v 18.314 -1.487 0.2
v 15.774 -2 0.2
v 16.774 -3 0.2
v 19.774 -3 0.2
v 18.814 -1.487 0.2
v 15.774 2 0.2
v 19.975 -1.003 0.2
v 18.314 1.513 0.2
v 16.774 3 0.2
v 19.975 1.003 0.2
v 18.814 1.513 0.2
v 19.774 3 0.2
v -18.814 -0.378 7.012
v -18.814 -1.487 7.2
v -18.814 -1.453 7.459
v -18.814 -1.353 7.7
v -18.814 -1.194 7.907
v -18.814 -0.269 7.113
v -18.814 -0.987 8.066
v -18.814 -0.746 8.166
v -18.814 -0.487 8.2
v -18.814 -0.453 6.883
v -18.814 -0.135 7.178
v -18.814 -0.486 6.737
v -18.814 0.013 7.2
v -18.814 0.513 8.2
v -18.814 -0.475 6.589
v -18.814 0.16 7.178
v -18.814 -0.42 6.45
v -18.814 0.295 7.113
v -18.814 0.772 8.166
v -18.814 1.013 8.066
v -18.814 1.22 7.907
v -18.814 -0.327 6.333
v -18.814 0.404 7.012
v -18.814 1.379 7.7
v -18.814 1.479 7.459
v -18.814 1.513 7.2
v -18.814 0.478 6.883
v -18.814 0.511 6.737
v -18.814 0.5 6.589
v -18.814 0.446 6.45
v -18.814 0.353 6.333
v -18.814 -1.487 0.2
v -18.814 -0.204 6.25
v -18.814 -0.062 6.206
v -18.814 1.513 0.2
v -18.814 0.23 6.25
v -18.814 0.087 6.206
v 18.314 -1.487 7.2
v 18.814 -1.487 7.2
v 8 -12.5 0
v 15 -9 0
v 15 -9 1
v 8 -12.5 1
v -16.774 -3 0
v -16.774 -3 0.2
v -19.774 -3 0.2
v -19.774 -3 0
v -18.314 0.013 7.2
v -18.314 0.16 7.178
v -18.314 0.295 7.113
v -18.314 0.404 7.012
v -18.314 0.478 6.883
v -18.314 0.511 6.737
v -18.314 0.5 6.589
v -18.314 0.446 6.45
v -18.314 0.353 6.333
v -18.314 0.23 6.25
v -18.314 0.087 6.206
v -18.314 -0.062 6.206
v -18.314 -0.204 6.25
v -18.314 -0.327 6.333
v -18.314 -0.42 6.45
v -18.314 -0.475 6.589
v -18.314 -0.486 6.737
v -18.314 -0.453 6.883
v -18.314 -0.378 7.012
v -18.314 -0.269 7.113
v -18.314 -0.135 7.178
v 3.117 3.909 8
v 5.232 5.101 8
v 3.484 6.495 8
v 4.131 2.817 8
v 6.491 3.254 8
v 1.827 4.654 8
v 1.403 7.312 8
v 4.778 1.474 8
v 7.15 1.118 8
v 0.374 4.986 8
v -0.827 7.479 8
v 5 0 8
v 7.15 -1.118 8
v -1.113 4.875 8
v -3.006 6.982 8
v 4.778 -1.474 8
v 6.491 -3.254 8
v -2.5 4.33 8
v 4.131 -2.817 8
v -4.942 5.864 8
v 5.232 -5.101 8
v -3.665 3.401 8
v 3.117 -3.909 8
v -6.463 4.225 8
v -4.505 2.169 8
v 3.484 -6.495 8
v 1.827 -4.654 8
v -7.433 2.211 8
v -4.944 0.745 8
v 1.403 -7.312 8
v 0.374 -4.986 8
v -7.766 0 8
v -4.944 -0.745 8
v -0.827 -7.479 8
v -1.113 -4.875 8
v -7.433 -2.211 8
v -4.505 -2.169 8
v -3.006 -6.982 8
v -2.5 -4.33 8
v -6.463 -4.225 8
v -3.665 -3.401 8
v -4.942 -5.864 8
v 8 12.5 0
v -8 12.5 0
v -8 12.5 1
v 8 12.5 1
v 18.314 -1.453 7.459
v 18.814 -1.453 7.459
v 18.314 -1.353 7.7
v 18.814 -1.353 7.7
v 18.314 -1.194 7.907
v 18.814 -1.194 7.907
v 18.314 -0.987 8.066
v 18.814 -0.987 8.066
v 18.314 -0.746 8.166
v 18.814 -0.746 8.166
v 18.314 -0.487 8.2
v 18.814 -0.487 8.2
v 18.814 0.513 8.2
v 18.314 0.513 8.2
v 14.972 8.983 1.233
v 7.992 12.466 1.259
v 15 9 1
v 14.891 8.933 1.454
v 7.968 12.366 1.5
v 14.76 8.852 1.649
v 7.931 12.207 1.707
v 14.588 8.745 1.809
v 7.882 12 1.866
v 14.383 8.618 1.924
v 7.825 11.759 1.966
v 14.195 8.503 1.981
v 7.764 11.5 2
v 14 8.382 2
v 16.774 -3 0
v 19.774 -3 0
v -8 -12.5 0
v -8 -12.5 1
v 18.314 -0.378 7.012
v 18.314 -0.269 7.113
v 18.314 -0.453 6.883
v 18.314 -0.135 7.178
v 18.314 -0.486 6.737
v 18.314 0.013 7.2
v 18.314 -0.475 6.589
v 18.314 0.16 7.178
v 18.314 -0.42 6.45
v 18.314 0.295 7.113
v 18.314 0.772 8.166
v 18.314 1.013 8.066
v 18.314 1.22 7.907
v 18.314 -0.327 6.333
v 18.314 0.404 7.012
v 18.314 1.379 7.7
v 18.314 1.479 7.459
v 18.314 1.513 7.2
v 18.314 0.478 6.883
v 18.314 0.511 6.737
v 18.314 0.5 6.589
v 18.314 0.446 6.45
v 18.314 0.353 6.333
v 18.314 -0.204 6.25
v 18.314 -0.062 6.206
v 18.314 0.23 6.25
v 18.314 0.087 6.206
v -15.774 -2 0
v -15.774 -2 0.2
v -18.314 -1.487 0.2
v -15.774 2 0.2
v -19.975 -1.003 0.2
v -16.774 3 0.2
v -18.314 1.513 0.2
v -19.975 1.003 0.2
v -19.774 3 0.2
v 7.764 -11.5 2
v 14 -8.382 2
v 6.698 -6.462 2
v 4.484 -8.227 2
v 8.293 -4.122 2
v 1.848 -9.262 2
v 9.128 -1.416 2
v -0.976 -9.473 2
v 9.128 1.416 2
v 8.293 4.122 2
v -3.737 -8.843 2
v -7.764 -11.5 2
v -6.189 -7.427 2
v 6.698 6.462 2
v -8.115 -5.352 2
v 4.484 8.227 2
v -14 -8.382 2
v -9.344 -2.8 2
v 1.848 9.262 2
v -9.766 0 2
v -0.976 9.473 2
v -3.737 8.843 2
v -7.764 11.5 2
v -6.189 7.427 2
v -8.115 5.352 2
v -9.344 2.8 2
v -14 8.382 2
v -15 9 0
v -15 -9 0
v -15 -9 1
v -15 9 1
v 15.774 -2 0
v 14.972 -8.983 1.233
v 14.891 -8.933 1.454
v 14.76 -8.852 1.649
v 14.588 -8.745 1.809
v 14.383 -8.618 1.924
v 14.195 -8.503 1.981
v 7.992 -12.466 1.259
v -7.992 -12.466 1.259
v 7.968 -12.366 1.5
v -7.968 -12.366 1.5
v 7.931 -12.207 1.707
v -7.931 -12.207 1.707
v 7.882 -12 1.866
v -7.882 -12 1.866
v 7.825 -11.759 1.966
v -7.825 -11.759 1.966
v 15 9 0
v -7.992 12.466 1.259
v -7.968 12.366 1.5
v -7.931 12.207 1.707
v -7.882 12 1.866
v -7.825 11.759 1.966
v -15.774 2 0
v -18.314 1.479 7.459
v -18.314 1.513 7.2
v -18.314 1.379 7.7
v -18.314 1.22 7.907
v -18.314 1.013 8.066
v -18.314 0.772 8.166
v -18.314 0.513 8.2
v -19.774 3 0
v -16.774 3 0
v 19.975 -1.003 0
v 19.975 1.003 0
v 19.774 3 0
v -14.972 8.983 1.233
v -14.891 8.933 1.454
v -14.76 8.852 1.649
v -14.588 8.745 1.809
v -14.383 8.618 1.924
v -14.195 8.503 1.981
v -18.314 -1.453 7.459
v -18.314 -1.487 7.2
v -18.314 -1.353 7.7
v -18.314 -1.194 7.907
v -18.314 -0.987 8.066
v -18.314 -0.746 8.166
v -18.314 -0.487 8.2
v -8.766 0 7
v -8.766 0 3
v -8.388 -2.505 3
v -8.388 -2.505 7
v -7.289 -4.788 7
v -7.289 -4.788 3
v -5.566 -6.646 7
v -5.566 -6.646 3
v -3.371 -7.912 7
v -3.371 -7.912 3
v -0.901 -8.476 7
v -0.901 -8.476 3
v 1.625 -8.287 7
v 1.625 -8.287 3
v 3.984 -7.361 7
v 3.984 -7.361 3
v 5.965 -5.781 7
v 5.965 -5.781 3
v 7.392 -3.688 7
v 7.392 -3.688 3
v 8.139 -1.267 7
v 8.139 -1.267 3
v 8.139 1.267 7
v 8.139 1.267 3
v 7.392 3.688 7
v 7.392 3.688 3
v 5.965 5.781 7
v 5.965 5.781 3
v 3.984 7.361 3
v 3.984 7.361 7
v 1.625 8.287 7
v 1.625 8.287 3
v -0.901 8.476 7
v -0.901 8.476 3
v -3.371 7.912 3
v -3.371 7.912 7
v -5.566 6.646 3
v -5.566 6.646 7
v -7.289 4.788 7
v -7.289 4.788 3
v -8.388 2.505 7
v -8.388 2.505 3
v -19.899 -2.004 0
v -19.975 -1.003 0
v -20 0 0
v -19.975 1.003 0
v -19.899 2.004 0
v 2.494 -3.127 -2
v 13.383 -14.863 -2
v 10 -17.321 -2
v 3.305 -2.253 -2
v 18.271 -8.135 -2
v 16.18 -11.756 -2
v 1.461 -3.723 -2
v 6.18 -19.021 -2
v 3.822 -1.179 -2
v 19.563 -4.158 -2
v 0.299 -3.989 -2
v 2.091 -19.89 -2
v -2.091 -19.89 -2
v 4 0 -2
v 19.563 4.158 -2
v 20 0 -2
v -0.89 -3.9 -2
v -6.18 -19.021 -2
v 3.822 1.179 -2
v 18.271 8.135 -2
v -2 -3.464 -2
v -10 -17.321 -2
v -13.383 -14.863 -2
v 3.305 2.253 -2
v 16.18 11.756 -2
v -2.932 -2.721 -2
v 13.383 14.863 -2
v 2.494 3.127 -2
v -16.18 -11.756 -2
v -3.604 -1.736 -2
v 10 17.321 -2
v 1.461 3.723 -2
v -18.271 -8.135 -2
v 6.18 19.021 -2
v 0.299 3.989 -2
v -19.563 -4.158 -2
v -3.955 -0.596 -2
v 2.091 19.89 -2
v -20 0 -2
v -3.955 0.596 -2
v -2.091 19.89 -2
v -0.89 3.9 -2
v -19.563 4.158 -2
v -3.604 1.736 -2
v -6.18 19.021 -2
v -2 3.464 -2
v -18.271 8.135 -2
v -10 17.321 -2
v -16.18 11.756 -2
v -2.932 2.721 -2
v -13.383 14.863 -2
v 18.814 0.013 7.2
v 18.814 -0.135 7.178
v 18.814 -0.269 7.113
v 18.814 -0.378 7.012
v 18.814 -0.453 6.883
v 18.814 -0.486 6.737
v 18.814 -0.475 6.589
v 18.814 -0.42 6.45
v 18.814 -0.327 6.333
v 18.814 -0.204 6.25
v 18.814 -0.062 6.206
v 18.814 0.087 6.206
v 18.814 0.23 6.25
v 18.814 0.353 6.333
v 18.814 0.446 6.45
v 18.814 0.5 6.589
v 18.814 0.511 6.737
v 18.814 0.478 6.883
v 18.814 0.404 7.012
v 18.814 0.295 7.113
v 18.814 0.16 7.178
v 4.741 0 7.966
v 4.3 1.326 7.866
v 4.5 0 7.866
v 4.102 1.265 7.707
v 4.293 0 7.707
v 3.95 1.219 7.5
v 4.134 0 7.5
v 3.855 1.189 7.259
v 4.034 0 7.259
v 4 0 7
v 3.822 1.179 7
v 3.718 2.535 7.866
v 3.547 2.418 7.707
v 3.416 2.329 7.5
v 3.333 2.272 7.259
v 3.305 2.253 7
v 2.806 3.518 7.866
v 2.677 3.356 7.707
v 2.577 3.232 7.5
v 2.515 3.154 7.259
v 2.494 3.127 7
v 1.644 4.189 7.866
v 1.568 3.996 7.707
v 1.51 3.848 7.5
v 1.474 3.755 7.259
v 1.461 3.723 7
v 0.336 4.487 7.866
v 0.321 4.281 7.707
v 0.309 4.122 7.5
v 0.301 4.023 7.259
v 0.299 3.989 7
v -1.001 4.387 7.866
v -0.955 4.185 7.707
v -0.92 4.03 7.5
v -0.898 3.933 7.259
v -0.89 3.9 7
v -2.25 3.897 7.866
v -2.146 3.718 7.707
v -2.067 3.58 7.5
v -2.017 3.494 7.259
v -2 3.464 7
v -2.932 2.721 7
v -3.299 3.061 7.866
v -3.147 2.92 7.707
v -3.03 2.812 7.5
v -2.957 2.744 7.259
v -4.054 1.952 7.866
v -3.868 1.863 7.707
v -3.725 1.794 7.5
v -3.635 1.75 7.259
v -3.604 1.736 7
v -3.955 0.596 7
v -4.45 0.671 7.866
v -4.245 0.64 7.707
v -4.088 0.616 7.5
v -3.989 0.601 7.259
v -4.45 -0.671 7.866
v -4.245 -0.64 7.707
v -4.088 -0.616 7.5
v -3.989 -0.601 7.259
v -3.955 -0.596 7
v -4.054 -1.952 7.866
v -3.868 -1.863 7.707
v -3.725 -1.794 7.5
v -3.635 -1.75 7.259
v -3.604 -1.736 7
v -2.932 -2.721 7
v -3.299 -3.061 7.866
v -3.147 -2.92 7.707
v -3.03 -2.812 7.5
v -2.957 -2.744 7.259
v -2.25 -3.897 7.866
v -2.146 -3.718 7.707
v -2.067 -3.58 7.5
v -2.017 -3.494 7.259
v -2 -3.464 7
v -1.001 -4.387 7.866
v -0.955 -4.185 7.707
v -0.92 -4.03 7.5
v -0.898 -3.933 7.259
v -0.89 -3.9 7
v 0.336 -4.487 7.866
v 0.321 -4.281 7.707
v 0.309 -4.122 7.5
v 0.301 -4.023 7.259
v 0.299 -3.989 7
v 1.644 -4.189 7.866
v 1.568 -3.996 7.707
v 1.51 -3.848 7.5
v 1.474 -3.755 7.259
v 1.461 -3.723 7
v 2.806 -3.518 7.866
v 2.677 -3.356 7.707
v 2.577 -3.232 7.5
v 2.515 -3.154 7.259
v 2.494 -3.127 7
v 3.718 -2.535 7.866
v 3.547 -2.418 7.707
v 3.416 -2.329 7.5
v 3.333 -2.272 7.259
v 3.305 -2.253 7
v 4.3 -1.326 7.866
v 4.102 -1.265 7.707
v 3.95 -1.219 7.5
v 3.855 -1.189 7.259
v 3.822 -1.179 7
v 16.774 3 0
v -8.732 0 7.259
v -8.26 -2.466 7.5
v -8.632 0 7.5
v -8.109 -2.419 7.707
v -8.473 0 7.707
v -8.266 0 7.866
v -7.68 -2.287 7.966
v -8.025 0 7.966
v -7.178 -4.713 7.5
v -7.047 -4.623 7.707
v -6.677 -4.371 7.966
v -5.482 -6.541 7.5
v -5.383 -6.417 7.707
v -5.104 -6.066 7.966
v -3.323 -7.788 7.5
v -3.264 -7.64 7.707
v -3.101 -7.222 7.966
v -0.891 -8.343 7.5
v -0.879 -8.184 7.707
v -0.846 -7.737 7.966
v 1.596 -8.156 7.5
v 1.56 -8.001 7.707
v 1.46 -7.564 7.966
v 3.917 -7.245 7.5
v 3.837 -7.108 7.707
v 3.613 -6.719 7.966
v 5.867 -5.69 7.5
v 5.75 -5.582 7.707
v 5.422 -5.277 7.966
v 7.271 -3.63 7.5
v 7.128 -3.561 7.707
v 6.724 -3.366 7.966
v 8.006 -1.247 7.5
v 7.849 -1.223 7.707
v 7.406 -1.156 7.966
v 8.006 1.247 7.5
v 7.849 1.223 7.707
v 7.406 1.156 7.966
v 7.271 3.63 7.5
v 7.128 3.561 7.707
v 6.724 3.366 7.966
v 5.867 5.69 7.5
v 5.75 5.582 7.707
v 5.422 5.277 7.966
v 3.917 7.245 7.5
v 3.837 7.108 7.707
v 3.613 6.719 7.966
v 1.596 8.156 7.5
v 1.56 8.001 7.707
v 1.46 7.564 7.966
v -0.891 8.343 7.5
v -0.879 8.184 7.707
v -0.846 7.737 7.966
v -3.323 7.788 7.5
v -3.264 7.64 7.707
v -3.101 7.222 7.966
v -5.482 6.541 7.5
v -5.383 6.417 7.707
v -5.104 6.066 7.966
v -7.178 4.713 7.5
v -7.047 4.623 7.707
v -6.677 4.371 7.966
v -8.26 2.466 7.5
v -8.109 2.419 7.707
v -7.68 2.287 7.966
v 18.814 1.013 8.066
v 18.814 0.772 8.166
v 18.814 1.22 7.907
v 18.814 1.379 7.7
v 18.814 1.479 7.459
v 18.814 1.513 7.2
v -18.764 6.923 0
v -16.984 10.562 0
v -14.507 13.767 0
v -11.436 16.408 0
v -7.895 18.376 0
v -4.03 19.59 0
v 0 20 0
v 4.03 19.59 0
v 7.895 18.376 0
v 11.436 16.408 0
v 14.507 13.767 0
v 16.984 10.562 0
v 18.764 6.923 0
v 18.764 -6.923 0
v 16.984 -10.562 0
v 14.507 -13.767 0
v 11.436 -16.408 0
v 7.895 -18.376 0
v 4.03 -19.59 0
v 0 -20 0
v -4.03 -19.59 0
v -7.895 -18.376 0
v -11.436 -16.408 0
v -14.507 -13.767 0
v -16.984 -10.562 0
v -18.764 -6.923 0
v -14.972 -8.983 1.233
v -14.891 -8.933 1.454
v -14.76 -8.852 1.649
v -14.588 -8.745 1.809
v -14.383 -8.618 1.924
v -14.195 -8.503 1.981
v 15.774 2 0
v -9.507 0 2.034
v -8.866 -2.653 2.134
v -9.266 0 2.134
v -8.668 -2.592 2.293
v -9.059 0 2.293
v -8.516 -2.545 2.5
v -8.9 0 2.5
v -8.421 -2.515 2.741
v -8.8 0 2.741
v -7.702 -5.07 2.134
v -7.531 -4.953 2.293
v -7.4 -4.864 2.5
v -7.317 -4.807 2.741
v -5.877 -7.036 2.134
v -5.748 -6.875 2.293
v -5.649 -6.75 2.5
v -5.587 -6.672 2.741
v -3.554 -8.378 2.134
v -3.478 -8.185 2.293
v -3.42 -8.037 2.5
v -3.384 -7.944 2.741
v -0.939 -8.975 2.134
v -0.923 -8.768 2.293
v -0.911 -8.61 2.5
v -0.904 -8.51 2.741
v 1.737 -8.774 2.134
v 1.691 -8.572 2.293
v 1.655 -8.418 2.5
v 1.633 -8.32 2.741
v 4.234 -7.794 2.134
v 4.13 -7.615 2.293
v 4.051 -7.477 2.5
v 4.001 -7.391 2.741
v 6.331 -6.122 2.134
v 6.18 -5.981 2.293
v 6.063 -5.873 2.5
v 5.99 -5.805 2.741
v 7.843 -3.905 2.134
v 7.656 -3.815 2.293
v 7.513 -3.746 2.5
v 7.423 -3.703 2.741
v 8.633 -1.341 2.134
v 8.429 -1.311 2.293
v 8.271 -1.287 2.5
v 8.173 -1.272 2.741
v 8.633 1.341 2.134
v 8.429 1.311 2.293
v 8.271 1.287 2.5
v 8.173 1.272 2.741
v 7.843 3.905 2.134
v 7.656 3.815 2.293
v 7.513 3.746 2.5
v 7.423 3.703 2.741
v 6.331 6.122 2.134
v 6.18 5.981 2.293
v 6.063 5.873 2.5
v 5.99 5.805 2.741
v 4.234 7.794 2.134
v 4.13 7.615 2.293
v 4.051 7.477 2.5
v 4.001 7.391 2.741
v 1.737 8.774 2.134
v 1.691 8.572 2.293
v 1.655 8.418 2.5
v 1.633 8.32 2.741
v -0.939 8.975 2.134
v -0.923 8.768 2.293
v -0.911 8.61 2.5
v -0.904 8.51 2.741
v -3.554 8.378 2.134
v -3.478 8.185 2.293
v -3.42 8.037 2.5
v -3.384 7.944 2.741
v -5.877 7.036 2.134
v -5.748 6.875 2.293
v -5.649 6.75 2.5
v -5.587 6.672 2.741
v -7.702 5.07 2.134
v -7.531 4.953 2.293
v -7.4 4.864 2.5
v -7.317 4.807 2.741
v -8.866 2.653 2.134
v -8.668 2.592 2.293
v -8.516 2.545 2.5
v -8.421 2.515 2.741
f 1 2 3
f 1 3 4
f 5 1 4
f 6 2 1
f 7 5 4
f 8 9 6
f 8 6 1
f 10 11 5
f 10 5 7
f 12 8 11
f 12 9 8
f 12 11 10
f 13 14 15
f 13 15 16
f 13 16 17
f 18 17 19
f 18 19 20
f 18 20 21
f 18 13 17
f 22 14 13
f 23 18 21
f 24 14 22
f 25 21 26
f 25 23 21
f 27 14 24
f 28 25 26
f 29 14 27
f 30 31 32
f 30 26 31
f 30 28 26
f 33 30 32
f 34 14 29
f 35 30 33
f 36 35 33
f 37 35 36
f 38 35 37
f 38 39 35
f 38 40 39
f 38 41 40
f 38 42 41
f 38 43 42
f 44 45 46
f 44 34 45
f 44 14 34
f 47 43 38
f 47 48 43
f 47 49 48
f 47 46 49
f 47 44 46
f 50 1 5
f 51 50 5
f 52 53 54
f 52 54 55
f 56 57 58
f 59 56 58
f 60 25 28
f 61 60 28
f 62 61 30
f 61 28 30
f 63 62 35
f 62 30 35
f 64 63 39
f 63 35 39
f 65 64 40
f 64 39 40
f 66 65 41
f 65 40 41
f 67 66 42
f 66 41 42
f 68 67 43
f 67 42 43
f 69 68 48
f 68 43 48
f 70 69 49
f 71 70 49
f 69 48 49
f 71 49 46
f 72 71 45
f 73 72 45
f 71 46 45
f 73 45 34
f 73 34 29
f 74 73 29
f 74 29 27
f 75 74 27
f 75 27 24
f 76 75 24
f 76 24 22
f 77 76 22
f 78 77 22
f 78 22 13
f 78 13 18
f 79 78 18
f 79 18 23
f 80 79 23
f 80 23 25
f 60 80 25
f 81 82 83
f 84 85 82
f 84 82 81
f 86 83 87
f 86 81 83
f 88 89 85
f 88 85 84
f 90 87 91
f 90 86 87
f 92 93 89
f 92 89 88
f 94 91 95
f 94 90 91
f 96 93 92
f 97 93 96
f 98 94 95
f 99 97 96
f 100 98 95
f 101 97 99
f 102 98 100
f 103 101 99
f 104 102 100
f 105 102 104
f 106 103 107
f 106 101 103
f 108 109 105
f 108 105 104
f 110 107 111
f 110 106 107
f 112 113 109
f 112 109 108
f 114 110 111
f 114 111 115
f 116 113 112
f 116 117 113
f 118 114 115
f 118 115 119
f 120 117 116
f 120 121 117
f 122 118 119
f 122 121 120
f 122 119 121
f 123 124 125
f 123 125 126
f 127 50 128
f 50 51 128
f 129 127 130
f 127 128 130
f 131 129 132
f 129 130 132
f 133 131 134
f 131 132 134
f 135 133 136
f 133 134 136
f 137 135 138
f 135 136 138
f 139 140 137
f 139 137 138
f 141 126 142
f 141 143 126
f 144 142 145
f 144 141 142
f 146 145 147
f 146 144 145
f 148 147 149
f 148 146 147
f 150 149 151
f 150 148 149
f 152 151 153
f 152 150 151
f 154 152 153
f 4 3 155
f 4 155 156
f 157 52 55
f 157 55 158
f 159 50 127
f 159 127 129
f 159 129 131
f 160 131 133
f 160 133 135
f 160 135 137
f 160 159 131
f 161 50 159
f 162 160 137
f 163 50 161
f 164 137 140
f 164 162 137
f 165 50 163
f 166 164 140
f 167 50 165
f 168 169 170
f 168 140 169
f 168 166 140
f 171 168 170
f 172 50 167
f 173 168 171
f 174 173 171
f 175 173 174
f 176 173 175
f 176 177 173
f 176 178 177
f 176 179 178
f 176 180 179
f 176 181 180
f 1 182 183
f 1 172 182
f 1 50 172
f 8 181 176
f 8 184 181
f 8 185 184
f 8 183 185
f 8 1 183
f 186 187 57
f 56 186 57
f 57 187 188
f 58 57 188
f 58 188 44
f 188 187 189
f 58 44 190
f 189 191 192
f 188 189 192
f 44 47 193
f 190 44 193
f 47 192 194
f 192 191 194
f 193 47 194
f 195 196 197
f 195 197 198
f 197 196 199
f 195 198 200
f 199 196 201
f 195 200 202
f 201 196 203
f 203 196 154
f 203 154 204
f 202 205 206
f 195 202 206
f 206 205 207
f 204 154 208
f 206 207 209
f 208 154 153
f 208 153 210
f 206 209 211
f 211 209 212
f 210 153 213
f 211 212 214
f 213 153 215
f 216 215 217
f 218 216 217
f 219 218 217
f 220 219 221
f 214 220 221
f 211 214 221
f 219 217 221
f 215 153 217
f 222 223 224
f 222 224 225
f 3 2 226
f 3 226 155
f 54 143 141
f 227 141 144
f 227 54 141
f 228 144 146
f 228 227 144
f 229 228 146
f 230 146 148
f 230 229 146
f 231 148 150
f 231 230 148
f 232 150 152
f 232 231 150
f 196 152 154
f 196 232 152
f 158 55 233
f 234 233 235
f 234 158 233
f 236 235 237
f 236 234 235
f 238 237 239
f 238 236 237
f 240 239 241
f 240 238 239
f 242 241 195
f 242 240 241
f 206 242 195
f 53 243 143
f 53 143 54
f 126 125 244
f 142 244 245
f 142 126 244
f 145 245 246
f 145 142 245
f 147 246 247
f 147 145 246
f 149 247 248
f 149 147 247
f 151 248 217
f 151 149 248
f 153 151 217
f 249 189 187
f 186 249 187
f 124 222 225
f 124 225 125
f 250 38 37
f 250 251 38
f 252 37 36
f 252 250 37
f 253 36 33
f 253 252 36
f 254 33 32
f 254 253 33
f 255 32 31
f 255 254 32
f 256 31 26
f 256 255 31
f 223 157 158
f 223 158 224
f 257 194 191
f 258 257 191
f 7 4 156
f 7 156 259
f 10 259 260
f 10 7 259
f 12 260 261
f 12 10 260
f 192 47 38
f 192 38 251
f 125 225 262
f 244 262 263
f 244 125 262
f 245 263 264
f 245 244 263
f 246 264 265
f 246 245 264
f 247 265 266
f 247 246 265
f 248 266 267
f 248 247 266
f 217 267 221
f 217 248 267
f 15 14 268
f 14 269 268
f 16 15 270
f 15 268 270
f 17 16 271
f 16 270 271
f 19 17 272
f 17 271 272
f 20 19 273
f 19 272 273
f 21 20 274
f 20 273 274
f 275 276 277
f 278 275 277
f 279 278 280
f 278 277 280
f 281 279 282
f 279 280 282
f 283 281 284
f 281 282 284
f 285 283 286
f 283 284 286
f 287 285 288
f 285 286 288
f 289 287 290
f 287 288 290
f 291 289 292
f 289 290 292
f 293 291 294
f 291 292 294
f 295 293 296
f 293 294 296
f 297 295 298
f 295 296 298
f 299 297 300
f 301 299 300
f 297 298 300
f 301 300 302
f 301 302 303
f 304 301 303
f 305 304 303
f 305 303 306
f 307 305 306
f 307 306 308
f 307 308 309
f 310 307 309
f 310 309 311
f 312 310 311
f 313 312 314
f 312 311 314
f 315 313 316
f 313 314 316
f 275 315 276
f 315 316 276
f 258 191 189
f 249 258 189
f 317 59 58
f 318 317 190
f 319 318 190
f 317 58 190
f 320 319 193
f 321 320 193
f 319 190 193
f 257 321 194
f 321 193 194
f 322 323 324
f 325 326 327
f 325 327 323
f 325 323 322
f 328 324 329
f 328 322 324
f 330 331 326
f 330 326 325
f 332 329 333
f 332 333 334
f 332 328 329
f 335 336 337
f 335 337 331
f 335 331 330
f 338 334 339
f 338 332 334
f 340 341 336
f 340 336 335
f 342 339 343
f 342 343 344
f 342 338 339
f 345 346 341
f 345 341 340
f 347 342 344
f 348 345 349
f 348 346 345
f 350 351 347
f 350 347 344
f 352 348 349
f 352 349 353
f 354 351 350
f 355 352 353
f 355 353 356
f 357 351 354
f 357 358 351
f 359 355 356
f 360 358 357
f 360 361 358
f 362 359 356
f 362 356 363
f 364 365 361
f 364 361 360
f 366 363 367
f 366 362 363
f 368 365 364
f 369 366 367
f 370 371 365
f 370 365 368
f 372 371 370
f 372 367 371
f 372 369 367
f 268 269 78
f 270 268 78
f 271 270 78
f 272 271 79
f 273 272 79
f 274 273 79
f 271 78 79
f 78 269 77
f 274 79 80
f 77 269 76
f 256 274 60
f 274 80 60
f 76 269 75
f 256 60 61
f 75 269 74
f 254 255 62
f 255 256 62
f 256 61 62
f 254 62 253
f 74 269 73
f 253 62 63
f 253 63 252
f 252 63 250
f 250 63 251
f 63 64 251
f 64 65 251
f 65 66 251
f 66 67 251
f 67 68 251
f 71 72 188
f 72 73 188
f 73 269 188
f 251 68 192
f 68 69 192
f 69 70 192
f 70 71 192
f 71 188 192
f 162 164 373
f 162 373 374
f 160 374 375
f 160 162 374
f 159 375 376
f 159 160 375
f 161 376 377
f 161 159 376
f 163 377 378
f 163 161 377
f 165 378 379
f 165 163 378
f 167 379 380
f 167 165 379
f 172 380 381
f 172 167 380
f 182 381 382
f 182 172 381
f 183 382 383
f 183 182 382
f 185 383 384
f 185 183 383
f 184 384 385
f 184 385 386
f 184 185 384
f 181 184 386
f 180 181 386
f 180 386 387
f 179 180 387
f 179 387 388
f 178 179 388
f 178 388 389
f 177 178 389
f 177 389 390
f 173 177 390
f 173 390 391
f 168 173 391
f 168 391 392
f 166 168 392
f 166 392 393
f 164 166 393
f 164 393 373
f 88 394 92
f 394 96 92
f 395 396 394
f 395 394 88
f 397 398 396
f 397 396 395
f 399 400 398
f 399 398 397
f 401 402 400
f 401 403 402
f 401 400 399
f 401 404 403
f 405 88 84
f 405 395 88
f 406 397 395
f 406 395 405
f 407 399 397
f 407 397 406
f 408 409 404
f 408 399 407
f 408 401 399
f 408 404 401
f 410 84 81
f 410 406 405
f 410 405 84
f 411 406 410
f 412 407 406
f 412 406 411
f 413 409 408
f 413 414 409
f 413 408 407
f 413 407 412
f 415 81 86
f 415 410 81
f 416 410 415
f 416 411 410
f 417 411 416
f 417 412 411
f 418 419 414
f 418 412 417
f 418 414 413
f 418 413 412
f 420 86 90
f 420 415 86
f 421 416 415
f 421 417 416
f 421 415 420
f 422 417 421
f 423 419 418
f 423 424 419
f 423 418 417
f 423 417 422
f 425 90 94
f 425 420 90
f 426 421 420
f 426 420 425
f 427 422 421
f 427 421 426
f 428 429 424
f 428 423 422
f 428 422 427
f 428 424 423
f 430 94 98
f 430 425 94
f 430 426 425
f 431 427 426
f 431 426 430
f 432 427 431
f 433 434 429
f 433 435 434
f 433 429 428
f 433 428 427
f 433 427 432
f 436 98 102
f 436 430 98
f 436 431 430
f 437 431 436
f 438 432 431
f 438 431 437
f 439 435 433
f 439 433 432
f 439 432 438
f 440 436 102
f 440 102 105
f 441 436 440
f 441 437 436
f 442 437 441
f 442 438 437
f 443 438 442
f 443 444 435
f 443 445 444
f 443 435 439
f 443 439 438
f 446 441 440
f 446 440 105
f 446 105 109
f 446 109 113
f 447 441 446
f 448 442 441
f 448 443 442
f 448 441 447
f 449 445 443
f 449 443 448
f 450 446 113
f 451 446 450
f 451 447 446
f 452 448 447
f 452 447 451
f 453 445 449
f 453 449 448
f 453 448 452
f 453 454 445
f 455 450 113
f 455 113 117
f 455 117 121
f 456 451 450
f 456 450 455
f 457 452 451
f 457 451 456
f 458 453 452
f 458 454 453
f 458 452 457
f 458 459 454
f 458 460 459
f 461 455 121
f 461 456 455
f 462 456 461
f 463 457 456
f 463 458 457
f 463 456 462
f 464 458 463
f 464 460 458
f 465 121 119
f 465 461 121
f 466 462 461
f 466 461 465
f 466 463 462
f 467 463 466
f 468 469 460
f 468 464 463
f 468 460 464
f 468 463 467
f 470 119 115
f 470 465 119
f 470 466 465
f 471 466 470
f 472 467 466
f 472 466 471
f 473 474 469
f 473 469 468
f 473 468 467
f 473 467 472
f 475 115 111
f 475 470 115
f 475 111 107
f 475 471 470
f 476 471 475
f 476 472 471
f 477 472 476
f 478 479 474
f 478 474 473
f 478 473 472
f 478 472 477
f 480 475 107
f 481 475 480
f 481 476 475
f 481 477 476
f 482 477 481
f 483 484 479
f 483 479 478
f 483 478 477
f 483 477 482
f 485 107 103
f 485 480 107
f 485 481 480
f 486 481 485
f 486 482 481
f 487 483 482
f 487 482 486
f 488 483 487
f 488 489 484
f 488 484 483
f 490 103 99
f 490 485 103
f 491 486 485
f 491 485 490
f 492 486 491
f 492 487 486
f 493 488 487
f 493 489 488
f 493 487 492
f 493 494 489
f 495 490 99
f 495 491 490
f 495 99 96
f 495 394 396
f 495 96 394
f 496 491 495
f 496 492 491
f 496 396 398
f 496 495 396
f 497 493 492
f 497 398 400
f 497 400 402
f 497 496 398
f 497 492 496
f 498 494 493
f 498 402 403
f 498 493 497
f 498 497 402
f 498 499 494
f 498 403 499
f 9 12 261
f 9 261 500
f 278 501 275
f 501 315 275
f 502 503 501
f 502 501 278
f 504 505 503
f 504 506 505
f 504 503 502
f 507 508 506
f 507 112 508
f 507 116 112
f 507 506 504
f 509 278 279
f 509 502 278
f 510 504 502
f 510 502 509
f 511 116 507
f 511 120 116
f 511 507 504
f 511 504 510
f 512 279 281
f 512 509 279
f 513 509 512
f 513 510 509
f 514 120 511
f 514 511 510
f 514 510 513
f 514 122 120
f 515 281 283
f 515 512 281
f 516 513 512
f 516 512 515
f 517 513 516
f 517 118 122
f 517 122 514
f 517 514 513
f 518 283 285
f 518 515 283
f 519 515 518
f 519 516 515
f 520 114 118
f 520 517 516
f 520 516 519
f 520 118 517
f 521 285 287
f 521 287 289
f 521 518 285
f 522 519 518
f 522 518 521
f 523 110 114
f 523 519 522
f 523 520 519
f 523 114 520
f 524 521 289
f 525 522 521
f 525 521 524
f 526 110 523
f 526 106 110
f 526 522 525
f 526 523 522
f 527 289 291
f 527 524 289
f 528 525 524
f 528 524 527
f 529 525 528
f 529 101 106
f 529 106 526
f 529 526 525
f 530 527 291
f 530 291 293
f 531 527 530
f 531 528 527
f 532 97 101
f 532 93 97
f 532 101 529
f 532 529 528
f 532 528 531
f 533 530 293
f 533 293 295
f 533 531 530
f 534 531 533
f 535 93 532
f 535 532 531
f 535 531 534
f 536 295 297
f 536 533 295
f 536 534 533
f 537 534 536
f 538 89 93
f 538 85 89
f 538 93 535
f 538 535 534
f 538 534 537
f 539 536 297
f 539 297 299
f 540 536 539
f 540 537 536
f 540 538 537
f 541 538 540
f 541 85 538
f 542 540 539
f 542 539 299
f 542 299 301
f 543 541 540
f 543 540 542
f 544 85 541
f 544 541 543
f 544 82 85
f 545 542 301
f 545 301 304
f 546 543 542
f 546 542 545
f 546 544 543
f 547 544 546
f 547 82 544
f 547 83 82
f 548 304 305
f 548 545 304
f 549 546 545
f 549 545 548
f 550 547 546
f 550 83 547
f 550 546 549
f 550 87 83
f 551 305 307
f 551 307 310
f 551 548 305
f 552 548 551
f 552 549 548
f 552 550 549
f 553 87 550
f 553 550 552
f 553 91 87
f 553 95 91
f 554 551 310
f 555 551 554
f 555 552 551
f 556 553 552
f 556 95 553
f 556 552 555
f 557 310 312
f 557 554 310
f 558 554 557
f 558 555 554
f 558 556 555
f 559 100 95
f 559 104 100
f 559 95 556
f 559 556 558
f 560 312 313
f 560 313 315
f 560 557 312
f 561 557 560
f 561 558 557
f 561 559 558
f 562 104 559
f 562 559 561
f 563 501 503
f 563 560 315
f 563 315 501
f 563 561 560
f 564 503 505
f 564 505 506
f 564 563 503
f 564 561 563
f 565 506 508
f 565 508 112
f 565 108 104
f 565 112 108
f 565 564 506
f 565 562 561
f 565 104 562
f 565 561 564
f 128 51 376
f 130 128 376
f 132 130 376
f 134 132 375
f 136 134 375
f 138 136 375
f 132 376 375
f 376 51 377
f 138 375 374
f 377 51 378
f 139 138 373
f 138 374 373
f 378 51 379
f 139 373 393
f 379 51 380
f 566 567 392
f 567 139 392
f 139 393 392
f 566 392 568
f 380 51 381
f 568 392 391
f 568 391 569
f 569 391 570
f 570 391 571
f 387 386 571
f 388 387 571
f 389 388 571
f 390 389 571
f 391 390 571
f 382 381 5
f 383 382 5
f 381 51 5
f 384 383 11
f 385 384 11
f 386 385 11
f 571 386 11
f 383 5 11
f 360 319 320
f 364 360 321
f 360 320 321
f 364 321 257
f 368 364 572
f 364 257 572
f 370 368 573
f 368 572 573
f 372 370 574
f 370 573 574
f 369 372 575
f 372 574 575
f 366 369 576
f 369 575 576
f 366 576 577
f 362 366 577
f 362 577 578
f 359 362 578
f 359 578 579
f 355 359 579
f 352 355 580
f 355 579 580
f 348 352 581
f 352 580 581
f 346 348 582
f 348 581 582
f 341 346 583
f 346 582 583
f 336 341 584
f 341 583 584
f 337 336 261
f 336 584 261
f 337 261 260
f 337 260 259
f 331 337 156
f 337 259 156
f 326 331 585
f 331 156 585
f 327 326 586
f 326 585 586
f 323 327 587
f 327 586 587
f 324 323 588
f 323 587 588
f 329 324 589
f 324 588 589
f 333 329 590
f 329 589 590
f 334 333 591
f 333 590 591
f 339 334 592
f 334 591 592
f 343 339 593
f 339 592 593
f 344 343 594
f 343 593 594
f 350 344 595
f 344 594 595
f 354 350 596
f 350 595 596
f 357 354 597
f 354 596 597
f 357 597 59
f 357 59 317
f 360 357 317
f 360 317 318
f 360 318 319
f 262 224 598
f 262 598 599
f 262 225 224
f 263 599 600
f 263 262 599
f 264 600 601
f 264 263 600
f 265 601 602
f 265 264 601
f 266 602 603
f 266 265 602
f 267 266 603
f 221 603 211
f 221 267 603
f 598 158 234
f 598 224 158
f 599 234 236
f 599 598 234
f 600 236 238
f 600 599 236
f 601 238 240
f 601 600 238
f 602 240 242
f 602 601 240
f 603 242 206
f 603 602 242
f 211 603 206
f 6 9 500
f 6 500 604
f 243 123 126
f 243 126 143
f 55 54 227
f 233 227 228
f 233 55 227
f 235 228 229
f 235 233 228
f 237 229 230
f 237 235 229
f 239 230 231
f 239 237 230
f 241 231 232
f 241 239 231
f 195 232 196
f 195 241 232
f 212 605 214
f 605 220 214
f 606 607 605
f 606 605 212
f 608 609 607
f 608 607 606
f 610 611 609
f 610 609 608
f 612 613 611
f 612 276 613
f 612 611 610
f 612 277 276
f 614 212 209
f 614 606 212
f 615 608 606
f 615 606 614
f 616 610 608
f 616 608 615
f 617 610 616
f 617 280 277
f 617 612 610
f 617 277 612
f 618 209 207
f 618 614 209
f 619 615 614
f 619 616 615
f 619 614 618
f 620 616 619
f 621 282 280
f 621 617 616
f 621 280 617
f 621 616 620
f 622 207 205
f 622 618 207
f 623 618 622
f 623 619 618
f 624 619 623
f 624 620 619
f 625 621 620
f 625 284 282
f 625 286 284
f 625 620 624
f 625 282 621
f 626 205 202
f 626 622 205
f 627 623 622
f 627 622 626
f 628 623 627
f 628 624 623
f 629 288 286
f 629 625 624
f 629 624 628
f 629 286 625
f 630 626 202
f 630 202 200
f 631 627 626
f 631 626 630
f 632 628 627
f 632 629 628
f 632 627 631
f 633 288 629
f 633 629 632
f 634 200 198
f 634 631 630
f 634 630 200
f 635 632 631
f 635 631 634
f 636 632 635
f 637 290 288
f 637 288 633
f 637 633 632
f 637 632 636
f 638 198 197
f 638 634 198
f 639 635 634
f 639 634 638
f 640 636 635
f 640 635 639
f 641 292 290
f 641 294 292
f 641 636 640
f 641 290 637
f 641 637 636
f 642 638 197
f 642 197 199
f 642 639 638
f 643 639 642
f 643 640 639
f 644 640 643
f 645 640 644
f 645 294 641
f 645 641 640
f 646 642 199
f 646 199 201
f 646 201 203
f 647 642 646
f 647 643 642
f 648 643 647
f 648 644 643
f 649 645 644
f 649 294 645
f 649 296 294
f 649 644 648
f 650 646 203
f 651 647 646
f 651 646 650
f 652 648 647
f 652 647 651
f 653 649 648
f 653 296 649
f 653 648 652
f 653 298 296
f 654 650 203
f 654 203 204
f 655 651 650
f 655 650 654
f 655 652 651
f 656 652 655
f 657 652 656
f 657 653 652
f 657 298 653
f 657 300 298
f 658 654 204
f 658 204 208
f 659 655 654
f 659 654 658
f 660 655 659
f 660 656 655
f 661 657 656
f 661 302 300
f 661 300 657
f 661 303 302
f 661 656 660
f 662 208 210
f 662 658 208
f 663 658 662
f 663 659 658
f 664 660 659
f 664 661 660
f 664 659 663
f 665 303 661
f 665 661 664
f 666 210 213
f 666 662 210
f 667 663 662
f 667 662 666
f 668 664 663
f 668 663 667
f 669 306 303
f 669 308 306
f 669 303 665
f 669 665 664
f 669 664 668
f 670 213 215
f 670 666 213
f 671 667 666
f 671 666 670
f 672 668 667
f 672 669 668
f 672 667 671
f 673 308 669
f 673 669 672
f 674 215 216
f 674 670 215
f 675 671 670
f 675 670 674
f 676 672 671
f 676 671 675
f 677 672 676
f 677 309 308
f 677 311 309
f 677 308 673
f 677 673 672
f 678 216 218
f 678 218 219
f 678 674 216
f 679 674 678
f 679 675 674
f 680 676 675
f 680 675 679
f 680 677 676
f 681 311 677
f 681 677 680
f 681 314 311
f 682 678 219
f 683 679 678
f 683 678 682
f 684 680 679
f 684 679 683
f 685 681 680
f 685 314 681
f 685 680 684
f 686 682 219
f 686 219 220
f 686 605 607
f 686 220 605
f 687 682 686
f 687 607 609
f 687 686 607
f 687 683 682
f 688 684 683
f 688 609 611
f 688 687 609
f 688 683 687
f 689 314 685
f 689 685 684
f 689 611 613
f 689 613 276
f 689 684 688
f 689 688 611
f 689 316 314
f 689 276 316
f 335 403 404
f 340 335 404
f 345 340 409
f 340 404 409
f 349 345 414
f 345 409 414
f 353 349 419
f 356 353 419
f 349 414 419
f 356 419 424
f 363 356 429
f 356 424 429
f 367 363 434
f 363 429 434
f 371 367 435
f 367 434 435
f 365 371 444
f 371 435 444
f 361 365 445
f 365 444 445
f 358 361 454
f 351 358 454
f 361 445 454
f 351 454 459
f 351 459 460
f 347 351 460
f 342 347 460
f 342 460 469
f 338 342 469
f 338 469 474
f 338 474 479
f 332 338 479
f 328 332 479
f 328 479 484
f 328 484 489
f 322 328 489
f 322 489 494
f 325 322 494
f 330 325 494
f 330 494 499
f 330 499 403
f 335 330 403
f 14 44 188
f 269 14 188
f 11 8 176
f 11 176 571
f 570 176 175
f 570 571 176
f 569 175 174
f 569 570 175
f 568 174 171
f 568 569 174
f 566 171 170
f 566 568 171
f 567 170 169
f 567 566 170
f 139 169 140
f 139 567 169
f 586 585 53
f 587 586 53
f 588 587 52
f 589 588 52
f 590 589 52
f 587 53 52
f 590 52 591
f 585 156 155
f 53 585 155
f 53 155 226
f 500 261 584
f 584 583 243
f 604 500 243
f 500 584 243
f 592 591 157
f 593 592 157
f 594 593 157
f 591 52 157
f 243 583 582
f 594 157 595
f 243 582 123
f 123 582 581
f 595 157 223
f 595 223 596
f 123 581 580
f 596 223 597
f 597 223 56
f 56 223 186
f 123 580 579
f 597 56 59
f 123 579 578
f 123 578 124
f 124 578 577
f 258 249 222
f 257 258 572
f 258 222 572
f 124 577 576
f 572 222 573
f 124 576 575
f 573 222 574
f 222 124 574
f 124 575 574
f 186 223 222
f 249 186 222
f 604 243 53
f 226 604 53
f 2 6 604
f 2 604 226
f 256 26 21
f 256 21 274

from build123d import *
from build123d.topology import SkipClean

# Parameters (mm, degrees)
BOSS_EXTRUDE1_DEPTH = 2
SKETCH2_R           = 20
BOSS_EXTRUDE2_DEPTH = 2
FILLET1_R           = 1
SKETCH3_R           = 8.5
BOSS_EXTRUDE3_DEPTH = 6
SKETCH4_R           = 4
CUT_EXTRUDE1_DEPTH  = 31
FILLET2_R           = 1
BOSS_EXTRUDE4_START = 0.2
BOSS_EXTRUDE4_DEPTH = 0.2
SKETCH6_W           = 0.5
SKETCH6_H           = 3
BOSS_EXTRUDE5_DEPTH = 8
FILLET3_R           = 1
SKETCH7_R           = 0.5
CUT_EXTRUDE2_DEPTH  = 4
CUT_EXTRUDE3_START  = -4
SKETCH8_R           = 0.5
CUT_EXTRUDE3_DEPTH  = 4


with BuildPart() as part:
    # Sketch1 → Boss-Extrude1 (new body)
    with BuildSketch(Plane.XY):
        Polygon((-15, 9), (-8, 12.5), (8, 12.5), (15, 9), (15, -9), (8, -12.5), (-8, -12.5), (-15, -9), align=None)
    extrude(amount=BOSS_EXTRUDE1_DEPTH)

    # Sketch2 → Boss-Extrude2 (add)
    with BuildSketch(Plane(origin=(0, 0, 0), x_dir=(-1, 0, 0), z_dir=(0, 0, -1))):
        Circle(SKETCH2_R)
    extrude(amount=BOSS_EXTRUDE2_DEPTH)

    # Fillet1
    fillet1_edges = [part.edges().sort_by_distance(p)[0] for p in [
        (-15, 0, 2),
        (-11.5, -10.75, 2),
        (0, -12.5, 2),
        (11.5, -10.75, 2),
        (15, 0, 2),
        (11.5, 10.75, 2),
        (0, 12.5, 2),
        (-11.5, 10.75, 2),
    ]]
    fillet(fillet1_edges, radius=FILLET1_R)

    # Sketch3 → Boss-Extrude3 (add)
    with BuildSketch(Plane.XY.offset(2)):
        with Locations(Location((-0.2660856, 0, 0), (0, 0, 180))):
            Circle(SKETCH3_R)
    extrude(amount=BOSS_EXTRUDE3_DEPTH)

    # Sketch4 → Cut-Extrude1 (cut, through all)
    with BuildSketch(Plane.XY.offset(8)):
        Circle(SKETCH4_R)
    extrude(amount=-CUT_EXTRUDE1_DEPTH, mode=Mode.SUBTRACT)

    # Fillet2
    fillet2_edges = [part.edges().sort_by_distance(p)[0] for p in [
        (8.2339144, 0, 2),
        (8.2339144, 0, 8),
        (-4, 0, 8),
    ]]
    fillet(fillet2_edges, radius=FILLET2_R)

    # Sketch5 → Boss-Extrude4 (add)
    with SkipClean():  # the faces are left unmerged after this step: merging them gives an invalid solid
        with BuildSketch(Plane.XY.offset(BOSS_EXTRUDE4_START)):
            with BuildLine():
                Line((-19.773719933, 3), (-16.773719933, 3))
                Line((-16.773719933, 3), (-15.773719933, 2))
                Line((-15.773719933, 2), (-15.773719933, -2))
                Line((-15.773719933, -2), (-16.773719933, -3))
                Line((-16.773719933, -3), (-19.773719933, -3))
                ThreePointArc((-19.773719933, -3), (-20, 0), (-19.773719933, 3))
            make_face()
            with BuildLine():
                Line((19.773719933, 3), (16.773719933, 3))
                Line((16.773719933, 3), (15.773719933, 2))
                Line((15.773719933, 2), (15.773719933, -2))
                Line((15.773719933, -2), (16.773719933, -3))
                Line((16.773719933, -3), (19.773719933, -3))
                ThreePointArc((19.773719933, -3), (20, 0), (19.773719933, 3))
            make_face()
        extrude(amount=-BOSS_EXTRUDE4_DEPTH)

    # Sketch6 → Boss-Extrude5 (add)
    with SkipClean():  # the faces are left unmerged after this step: merging them gives an invalid solid
        with BuildSketch(Plane.XY.offset(0.2)):
            with Locations((-18.564246067, 0.012841423)):
                Rectangle(SKETCH6_W, SKETCH6_H)
            with Locations((18.564246067, 0.012841423)):
                Rectangle(SKETCH6_W, SKETCH6_H)
        extrude(amount=BOSS_EXTRUDE5_DEPTH)

    # Fillet3
    fillet3_edges = [part.edges().sort_by_distance(p)[0] for p in [
        (-18.564246067, 1.512841423, 8.2),
        (-18.564246067, -1.487158577, 8.2),
        (18.564246067, 1.512841423, 8.2),
        (18.564246067, -1.487158577, 8.2),
    ]]
    fillet(fillet3_edges, radius=FILLET3_R)

    # Sketch7 → Cut-Extrude2 (cut)
    with BuildSketch(Plane.ZY.offset(18.814246067)):
        with Locations((6.7, 0.012841423)):
            Circle(SKETCH7_R)
    extrude(amount=-CUT_EXTRUDE2_DEPTH, mode=Mode.SUBTRACT)

    # Sketch8 → Cut-Extrude3 (cut)
    with BuildSketch(Plane(origin=(18.814246067, 0, 0), x_dir=(0, 0, -1), z_dir=(1, 0, 0)).offset(CUT_EXTRUDE3_START)):
        with Locations(Location((-6.7, 0.012841423, 0), (0, 0, 180))):
            Circle(SKETCH8_R)
    extrude(amount=CUT_EXTRUDE3_DEPTH, mode=Mode.SUBTRACT)


solid = part.part
